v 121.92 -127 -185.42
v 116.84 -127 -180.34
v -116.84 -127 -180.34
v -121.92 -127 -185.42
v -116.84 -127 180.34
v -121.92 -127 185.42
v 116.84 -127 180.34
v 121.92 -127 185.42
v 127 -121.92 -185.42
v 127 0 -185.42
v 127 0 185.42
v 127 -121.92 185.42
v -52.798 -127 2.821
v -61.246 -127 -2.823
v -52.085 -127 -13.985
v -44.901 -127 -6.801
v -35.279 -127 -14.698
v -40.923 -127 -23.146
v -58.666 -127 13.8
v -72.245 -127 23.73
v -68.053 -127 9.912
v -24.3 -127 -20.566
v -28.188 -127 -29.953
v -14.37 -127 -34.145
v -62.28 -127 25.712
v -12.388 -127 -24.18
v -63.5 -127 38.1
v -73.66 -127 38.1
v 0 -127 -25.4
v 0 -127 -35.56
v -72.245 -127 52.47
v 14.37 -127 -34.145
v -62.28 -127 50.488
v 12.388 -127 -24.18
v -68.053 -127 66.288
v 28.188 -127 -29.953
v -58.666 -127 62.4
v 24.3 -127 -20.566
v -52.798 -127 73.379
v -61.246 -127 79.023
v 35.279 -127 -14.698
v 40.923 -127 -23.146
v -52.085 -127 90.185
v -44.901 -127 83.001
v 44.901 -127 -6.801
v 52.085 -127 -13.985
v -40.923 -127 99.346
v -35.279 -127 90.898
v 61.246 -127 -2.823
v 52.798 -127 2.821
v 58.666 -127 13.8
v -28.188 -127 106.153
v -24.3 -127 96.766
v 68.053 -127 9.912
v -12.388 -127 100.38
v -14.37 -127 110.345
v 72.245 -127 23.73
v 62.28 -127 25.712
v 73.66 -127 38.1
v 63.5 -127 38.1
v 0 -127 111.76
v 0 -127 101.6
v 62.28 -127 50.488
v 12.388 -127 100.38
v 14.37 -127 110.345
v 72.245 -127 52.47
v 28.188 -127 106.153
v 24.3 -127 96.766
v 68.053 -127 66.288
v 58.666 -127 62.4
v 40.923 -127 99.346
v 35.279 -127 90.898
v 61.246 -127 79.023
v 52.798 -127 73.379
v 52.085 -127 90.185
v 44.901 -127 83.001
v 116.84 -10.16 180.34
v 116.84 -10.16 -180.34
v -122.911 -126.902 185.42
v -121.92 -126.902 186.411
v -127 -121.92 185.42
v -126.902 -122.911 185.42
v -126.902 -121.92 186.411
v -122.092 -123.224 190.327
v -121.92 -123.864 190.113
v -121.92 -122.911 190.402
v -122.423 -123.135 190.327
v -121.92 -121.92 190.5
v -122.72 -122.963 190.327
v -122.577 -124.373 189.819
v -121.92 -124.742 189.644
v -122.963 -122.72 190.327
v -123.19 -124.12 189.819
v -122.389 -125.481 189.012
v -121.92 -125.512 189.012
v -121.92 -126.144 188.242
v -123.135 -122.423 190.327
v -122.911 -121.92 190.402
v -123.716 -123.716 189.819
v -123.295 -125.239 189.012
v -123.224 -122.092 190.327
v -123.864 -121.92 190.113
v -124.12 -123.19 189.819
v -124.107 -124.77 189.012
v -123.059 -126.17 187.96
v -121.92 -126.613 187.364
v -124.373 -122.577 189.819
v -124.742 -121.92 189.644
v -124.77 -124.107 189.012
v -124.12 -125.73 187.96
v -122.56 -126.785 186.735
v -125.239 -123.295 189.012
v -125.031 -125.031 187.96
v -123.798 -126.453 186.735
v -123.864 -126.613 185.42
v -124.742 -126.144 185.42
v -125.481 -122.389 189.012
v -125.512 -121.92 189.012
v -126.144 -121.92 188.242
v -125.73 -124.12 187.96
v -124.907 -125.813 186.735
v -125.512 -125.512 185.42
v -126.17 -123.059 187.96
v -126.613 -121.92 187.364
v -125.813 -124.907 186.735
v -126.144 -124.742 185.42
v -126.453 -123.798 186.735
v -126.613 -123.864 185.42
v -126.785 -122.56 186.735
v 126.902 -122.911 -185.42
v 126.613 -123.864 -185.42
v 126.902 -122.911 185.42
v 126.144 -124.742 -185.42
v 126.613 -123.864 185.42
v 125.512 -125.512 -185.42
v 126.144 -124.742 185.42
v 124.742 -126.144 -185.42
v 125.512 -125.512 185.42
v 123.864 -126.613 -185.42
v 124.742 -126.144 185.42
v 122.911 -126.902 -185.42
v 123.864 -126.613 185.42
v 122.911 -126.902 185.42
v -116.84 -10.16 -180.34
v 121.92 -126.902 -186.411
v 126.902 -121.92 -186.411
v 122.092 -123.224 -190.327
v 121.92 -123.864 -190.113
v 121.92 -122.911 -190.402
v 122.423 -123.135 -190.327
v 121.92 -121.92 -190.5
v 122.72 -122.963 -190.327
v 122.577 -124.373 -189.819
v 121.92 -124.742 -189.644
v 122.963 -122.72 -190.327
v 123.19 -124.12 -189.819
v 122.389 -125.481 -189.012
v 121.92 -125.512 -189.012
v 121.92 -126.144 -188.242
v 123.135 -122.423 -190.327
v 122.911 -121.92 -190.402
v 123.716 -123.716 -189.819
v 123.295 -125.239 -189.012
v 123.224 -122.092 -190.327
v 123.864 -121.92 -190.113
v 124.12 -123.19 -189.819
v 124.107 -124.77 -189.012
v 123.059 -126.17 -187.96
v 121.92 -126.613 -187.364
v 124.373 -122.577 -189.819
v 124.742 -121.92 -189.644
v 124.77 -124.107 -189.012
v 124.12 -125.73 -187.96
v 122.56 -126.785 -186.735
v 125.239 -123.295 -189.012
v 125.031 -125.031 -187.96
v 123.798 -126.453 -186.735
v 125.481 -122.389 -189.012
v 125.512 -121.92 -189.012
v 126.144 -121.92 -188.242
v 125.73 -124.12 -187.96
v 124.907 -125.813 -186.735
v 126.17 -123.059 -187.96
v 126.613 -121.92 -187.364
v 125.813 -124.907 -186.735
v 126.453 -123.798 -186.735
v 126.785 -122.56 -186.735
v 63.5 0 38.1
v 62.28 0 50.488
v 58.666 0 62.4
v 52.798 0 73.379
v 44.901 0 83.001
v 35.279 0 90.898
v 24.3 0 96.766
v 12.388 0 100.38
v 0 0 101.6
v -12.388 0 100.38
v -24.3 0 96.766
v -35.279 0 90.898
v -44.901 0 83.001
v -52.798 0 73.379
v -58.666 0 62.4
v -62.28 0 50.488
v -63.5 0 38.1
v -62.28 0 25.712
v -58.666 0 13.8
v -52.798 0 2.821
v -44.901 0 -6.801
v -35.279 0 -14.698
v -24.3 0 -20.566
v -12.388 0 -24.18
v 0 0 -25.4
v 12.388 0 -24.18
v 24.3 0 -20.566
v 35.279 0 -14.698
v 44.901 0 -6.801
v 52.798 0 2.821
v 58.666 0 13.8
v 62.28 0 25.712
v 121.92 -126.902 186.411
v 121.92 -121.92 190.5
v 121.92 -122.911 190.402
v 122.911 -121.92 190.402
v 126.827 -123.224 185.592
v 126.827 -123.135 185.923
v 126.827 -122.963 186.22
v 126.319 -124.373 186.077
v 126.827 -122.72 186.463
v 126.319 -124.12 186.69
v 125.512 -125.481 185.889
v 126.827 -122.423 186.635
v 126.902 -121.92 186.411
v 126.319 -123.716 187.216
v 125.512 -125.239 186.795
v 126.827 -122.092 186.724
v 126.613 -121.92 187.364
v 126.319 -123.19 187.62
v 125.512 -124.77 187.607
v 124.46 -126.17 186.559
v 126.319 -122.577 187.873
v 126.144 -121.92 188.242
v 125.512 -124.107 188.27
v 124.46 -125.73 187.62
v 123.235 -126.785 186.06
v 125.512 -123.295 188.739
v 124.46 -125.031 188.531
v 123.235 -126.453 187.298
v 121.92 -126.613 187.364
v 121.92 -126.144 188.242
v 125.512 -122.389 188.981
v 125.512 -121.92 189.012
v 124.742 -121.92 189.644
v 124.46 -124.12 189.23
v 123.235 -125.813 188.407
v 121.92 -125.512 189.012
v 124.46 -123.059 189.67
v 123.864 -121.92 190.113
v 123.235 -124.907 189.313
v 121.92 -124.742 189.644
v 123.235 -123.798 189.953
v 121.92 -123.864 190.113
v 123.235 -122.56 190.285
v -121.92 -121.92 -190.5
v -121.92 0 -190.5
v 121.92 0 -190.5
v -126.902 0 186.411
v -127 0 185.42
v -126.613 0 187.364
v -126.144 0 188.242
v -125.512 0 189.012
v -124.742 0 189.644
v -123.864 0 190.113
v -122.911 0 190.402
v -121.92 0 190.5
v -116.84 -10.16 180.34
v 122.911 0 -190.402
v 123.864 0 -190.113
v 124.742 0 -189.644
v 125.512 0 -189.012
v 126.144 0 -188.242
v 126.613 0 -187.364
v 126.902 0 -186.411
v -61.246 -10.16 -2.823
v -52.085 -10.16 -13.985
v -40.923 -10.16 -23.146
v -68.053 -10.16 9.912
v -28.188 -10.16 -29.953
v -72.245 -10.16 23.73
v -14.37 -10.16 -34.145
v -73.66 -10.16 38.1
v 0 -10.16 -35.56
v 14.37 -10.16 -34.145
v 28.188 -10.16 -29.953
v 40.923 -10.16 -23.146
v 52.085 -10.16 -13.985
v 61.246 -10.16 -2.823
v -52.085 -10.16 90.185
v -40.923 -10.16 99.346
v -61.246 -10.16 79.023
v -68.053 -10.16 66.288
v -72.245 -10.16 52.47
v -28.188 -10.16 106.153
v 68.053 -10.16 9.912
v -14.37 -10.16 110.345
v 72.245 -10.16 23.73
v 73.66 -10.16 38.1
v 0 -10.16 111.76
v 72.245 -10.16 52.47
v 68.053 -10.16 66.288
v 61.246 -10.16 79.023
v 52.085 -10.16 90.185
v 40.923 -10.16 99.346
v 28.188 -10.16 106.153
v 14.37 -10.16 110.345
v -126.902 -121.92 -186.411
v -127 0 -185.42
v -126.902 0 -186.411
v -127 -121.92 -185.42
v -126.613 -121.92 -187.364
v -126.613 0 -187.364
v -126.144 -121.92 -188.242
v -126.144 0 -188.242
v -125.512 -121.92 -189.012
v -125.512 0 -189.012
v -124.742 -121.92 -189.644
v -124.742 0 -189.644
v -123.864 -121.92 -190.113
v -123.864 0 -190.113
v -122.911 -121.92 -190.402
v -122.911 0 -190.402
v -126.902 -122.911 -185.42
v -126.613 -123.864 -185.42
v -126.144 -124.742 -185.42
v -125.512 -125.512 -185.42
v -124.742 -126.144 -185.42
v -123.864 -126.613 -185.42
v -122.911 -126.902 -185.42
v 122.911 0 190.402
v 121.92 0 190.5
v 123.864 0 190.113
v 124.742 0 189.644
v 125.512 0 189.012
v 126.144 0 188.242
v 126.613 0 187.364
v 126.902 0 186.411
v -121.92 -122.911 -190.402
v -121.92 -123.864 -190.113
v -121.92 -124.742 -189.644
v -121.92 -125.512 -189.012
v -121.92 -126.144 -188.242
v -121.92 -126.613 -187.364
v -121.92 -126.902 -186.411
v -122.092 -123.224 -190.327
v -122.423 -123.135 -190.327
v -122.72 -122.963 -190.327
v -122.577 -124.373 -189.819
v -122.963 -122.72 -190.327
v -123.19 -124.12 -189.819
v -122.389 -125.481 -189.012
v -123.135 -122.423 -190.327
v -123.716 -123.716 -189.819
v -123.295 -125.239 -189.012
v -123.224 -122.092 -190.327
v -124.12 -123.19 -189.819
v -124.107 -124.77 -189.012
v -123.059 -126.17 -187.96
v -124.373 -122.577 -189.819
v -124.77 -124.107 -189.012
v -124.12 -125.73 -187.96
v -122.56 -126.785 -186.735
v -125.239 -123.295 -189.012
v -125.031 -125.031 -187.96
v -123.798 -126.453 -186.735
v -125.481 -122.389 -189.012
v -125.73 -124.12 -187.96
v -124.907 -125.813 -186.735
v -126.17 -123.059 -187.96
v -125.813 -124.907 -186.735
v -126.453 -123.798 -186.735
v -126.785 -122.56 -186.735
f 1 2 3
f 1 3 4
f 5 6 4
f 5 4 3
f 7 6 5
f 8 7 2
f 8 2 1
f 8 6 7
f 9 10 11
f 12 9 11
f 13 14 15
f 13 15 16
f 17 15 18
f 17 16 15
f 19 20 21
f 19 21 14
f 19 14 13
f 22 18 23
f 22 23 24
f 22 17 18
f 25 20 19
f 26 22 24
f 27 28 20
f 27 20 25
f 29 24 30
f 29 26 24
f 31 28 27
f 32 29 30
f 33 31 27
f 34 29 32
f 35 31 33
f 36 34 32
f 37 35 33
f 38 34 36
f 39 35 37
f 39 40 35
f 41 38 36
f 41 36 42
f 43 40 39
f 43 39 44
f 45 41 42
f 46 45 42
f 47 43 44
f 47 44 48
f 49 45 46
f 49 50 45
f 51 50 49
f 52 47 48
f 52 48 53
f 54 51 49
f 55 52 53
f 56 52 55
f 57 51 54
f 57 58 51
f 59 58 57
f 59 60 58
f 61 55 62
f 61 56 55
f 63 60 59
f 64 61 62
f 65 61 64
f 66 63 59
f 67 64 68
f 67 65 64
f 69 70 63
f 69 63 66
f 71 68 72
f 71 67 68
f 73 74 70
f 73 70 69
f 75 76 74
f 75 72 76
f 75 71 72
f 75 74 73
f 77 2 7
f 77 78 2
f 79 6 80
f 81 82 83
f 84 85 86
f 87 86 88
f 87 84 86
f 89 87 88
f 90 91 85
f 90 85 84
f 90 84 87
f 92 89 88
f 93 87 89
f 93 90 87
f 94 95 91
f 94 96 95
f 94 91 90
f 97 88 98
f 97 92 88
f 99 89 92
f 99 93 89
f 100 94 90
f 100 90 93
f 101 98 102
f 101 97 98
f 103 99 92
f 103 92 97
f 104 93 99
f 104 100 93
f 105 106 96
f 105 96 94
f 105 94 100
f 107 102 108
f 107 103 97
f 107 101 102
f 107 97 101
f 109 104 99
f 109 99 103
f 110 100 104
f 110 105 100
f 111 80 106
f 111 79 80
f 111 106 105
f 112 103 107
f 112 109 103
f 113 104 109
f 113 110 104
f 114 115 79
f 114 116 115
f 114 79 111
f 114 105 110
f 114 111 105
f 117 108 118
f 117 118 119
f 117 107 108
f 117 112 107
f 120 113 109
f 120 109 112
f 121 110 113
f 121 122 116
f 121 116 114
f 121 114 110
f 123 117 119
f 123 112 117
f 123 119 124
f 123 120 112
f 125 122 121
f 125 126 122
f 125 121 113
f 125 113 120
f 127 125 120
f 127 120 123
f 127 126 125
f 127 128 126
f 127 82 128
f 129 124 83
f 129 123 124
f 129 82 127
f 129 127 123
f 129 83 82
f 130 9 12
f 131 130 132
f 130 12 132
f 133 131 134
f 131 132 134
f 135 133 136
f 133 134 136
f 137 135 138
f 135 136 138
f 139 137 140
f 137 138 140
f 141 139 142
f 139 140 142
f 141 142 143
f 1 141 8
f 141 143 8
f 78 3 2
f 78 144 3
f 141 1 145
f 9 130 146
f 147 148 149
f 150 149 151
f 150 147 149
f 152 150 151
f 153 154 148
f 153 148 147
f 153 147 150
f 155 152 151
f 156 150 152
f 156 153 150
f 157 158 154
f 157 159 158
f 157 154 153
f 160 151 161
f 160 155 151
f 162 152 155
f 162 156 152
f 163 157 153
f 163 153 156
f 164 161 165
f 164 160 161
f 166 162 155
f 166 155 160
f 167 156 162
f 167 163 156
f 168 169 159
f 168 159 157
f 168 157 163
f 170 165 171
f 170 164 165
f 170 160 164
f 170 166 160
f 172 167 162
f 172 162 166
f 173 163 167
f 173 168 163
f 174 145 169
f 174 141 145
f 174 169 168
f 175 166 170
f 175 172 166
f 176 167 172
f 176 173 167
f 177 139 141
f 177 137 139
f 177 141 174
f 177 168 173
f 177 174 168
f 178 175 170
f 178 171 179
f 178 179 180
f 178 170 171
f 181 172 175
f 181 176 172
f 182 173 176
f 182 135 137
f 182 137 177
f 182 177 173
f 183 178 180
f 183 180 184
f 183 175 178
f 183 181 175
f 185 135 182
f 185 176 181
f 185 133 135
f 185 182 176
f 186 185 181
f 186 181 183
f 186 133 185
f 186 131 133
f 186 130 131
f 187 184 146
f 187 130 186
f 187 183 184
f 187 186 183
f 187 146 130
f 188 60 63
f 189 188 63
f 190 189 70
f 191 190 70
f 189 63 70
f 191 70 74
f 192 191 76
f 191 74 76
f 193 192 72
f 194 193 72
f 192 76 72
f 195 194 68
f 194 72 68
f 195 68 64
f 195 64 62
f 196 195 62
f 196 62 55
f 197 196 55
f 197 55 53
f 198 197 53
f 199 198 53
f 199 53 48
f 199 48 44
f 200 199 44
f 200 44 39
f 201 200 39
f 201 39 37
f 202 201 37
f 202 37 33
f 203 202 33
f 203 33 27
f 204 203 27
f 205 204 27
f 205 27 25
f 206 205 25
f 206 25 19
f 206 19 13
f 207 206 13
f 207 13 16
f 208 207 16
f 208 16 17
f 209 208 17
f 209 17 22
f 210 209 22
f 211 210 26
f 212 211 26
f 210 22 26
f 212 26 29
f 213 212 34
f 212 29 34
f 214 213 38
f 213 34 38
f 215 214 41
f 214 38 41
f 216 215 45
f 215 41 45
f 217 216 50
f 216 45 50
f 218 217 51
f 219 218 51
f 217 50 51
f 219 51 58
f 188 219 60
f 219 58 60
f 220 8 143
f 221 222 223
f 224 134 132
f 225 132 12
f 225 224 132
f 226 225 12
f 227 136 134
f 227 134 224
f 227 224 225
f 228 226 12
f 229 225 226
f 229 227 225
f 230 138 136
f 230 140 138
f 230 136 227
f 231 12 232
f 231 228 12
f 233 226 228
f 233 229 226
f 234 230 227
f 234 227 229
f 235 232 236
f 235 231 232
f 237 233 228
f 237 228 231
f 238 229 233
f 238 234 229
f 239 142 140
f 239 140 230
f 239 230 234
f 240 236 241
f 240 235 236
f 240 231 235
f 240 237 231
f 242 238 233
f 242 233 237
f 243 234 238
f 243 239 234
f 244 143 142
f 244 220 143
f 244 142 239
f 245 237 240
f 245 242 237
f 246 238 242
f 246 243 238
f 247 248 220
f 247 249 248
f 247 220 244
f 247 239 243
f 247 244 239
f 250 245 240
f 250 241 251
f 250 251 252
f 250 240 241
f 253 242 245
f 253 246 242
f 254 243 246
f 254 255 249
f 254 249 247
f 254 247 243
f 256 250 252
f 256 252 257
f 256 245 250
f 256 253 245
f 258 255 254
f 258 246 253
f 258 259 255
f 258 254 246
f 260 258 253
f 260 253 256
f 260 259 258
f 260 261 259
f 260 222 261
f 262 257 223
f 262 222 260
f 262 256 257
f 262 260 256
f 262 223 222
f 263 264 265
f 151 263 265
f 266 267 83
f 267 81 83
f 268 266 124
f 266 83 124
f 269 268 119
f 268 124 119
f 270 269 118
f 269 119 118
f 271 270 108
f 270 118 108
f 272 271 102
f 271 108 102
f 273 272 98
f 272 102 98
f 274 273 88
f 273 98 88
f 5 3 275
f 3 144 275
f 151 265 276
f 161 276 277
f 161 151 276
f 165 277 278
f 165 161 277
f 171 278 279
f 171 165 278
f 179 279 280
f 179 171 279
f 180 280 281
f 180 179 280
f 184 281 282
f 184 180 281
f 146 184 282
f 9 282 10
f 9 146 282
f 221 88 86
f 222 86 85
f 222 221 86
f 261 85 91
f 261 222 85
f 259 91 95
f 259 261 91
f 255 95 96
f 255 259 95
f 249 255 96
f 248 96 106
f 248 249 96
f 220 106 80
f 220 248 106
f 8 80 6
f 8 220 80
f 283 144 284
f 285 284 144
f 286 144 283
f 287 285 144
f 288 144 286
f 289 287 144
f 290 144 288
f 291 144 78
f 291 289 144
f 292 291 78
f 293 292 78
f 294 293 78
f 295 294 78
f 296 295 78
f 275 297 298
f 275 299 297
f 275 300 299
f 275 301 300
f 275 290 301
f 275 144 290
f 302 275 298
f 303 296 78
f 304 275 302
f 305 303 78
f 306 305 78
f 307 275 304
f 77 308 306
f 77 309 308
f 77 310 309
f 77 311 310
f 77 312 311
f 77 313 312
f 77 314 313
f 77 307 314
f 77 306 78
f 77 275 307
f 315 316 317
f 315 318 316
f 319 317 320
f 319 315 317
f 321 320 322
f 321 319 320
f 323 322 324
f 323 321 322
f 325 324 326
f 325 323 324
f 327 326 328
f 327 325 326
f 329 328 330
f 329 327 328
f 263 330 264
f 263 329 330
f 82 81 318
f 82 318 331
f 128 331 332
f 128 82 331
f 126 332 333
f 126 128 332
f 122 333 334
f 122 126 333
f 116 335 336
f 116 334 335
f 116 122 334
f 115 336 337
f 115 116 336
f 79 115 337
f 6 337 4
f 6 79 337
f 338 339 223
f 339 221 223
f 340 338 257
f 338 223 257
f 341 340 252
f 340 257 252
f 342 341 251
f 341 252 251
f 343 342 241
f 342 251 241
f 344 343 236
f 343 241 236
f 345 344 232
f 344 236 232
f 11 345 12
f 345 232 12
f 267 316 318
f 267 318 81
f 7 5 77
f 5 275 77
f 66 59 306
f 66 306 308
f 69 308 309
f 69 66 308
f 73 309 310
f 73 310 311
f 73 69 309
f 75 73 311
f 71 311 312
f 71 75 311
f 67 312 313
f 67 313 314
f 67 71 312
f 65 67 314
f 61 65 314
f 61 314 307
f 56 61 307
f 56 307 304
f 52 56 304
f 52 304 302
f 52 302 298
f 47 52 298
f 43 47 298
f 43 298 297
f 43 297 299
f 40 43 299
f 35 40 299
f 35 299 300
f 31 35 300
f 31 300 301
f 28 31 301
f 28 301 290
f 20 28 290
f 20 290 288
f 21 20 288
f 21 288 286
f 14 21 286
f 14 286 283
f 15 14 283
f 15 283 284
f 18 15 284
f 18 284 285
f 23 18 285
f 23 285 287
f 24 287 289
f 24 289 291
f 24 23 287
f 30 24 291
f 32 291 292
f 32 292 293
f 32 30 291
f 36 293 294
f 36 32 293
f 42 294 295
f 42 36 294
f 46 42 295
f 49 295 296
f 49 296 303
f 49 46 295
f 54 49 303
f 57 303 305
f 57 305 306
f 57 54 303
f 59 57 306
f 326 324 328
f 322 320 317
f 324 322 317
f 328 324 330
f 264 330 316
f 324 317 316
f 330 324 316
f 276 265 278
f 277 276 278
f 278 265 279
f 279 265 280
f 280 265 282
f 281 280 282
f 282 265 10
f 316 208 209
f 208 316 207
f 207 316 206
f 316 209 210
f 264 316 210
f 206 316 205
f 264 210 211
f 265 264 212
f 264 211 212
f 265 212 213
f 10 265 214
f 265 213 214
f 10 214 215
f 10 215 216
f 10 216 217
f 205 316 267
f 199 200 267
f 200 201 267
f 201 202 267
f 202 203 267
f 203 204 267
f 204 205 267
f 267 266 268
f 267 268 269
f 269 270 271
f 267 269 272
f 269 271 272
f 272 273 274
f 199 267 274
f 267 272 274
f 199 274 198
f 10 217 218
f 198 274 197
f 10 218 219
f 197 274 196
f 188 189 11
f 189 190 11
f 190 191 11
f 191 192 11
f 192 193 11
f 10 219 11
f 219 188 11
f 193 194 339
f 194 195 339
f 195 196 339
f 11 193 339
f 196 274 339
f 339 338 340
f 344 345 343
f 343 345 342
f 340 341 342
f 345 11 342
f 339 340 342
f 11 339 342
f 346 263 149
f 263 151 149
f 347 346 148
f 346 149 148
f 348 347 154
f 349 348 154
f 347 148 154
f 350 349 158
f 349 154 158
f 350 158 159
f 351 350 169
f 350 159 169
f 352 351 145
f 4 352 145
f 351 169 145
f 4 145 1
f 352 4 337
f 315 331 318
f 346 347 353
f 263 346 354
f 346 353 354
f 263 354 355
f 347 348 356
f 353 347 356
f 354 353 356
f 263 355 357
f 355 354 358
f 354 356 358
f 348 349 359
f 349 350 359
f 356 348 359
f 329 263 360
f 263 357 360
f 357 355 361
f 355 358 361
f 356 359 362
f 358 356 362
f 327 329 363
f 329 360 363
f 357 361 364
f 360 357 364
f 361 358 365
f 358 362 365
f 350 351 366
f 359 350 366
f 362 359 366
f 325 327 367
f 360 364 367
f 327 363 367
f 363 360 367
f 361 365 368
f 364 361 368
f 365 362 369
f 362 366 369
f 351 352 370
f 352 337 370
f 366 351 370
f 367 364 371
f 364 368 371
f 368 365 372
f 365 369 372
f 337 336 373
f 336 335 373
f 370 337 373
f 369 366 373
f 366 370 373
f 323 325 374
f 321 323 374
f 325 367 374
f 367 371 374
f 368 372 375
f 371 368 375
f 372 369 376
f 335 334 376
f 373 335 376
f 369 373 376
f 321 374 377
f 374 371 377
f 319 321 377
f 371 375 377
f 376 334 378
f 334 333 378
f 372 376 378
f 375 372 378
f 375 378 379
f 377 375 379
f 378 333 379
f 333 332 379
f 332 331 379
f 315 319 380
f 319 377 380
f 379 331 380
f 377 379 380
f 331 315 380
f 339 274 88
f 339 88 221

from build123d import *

# Parameters (mm, degrees)
F0_W     = 254
F0_H     = 381
F1_DEPTH = 127
F2_R     = 63.5
F3_DEPTH = 127.001
F4_T     = -10.16
F5_R     = 5.08


with BuildPart() as f1:
    # F0 (on Front) → F1 (new body)
    with BuildSketch(Plane.XZ):
        Rectangle(F0_W, F0_H)
    extrude(amount=F1_DEPTH)

    # F2 (on face) → F3 (cut, through all)
    with BuildSketch(Plane.XZ.offset(127)):
        with Locations((0, 38.1)):
            Circle(F2_R)
    extrude(amount=-F3_DEPTH, mode=Mode.SUBTRACT)

    # F4
    f4_openings = [f1.faces().sort_by_distance(p)[0] for p in [
        (0, -127, -185.92095),
    ]]
    offset(amount=F4_T, openings=f4_openings)

    # F5
    f5_edges = [f1.edges().sort_by_distance(p)[0] for p in [
        (-127, -127, 0),
        (0, -127, 190.5),
        (127, -127, 0),
        (0, -127, -190.5),
        (127, -63.5, -190.5),
        (127, -63.5, 190.5),
        (-127, -63.5, 190.5),
        (-127, -63.5, -190.5),
    ]]
    fillet(f5_edges, radius=F5_R)


solid = f1.part
